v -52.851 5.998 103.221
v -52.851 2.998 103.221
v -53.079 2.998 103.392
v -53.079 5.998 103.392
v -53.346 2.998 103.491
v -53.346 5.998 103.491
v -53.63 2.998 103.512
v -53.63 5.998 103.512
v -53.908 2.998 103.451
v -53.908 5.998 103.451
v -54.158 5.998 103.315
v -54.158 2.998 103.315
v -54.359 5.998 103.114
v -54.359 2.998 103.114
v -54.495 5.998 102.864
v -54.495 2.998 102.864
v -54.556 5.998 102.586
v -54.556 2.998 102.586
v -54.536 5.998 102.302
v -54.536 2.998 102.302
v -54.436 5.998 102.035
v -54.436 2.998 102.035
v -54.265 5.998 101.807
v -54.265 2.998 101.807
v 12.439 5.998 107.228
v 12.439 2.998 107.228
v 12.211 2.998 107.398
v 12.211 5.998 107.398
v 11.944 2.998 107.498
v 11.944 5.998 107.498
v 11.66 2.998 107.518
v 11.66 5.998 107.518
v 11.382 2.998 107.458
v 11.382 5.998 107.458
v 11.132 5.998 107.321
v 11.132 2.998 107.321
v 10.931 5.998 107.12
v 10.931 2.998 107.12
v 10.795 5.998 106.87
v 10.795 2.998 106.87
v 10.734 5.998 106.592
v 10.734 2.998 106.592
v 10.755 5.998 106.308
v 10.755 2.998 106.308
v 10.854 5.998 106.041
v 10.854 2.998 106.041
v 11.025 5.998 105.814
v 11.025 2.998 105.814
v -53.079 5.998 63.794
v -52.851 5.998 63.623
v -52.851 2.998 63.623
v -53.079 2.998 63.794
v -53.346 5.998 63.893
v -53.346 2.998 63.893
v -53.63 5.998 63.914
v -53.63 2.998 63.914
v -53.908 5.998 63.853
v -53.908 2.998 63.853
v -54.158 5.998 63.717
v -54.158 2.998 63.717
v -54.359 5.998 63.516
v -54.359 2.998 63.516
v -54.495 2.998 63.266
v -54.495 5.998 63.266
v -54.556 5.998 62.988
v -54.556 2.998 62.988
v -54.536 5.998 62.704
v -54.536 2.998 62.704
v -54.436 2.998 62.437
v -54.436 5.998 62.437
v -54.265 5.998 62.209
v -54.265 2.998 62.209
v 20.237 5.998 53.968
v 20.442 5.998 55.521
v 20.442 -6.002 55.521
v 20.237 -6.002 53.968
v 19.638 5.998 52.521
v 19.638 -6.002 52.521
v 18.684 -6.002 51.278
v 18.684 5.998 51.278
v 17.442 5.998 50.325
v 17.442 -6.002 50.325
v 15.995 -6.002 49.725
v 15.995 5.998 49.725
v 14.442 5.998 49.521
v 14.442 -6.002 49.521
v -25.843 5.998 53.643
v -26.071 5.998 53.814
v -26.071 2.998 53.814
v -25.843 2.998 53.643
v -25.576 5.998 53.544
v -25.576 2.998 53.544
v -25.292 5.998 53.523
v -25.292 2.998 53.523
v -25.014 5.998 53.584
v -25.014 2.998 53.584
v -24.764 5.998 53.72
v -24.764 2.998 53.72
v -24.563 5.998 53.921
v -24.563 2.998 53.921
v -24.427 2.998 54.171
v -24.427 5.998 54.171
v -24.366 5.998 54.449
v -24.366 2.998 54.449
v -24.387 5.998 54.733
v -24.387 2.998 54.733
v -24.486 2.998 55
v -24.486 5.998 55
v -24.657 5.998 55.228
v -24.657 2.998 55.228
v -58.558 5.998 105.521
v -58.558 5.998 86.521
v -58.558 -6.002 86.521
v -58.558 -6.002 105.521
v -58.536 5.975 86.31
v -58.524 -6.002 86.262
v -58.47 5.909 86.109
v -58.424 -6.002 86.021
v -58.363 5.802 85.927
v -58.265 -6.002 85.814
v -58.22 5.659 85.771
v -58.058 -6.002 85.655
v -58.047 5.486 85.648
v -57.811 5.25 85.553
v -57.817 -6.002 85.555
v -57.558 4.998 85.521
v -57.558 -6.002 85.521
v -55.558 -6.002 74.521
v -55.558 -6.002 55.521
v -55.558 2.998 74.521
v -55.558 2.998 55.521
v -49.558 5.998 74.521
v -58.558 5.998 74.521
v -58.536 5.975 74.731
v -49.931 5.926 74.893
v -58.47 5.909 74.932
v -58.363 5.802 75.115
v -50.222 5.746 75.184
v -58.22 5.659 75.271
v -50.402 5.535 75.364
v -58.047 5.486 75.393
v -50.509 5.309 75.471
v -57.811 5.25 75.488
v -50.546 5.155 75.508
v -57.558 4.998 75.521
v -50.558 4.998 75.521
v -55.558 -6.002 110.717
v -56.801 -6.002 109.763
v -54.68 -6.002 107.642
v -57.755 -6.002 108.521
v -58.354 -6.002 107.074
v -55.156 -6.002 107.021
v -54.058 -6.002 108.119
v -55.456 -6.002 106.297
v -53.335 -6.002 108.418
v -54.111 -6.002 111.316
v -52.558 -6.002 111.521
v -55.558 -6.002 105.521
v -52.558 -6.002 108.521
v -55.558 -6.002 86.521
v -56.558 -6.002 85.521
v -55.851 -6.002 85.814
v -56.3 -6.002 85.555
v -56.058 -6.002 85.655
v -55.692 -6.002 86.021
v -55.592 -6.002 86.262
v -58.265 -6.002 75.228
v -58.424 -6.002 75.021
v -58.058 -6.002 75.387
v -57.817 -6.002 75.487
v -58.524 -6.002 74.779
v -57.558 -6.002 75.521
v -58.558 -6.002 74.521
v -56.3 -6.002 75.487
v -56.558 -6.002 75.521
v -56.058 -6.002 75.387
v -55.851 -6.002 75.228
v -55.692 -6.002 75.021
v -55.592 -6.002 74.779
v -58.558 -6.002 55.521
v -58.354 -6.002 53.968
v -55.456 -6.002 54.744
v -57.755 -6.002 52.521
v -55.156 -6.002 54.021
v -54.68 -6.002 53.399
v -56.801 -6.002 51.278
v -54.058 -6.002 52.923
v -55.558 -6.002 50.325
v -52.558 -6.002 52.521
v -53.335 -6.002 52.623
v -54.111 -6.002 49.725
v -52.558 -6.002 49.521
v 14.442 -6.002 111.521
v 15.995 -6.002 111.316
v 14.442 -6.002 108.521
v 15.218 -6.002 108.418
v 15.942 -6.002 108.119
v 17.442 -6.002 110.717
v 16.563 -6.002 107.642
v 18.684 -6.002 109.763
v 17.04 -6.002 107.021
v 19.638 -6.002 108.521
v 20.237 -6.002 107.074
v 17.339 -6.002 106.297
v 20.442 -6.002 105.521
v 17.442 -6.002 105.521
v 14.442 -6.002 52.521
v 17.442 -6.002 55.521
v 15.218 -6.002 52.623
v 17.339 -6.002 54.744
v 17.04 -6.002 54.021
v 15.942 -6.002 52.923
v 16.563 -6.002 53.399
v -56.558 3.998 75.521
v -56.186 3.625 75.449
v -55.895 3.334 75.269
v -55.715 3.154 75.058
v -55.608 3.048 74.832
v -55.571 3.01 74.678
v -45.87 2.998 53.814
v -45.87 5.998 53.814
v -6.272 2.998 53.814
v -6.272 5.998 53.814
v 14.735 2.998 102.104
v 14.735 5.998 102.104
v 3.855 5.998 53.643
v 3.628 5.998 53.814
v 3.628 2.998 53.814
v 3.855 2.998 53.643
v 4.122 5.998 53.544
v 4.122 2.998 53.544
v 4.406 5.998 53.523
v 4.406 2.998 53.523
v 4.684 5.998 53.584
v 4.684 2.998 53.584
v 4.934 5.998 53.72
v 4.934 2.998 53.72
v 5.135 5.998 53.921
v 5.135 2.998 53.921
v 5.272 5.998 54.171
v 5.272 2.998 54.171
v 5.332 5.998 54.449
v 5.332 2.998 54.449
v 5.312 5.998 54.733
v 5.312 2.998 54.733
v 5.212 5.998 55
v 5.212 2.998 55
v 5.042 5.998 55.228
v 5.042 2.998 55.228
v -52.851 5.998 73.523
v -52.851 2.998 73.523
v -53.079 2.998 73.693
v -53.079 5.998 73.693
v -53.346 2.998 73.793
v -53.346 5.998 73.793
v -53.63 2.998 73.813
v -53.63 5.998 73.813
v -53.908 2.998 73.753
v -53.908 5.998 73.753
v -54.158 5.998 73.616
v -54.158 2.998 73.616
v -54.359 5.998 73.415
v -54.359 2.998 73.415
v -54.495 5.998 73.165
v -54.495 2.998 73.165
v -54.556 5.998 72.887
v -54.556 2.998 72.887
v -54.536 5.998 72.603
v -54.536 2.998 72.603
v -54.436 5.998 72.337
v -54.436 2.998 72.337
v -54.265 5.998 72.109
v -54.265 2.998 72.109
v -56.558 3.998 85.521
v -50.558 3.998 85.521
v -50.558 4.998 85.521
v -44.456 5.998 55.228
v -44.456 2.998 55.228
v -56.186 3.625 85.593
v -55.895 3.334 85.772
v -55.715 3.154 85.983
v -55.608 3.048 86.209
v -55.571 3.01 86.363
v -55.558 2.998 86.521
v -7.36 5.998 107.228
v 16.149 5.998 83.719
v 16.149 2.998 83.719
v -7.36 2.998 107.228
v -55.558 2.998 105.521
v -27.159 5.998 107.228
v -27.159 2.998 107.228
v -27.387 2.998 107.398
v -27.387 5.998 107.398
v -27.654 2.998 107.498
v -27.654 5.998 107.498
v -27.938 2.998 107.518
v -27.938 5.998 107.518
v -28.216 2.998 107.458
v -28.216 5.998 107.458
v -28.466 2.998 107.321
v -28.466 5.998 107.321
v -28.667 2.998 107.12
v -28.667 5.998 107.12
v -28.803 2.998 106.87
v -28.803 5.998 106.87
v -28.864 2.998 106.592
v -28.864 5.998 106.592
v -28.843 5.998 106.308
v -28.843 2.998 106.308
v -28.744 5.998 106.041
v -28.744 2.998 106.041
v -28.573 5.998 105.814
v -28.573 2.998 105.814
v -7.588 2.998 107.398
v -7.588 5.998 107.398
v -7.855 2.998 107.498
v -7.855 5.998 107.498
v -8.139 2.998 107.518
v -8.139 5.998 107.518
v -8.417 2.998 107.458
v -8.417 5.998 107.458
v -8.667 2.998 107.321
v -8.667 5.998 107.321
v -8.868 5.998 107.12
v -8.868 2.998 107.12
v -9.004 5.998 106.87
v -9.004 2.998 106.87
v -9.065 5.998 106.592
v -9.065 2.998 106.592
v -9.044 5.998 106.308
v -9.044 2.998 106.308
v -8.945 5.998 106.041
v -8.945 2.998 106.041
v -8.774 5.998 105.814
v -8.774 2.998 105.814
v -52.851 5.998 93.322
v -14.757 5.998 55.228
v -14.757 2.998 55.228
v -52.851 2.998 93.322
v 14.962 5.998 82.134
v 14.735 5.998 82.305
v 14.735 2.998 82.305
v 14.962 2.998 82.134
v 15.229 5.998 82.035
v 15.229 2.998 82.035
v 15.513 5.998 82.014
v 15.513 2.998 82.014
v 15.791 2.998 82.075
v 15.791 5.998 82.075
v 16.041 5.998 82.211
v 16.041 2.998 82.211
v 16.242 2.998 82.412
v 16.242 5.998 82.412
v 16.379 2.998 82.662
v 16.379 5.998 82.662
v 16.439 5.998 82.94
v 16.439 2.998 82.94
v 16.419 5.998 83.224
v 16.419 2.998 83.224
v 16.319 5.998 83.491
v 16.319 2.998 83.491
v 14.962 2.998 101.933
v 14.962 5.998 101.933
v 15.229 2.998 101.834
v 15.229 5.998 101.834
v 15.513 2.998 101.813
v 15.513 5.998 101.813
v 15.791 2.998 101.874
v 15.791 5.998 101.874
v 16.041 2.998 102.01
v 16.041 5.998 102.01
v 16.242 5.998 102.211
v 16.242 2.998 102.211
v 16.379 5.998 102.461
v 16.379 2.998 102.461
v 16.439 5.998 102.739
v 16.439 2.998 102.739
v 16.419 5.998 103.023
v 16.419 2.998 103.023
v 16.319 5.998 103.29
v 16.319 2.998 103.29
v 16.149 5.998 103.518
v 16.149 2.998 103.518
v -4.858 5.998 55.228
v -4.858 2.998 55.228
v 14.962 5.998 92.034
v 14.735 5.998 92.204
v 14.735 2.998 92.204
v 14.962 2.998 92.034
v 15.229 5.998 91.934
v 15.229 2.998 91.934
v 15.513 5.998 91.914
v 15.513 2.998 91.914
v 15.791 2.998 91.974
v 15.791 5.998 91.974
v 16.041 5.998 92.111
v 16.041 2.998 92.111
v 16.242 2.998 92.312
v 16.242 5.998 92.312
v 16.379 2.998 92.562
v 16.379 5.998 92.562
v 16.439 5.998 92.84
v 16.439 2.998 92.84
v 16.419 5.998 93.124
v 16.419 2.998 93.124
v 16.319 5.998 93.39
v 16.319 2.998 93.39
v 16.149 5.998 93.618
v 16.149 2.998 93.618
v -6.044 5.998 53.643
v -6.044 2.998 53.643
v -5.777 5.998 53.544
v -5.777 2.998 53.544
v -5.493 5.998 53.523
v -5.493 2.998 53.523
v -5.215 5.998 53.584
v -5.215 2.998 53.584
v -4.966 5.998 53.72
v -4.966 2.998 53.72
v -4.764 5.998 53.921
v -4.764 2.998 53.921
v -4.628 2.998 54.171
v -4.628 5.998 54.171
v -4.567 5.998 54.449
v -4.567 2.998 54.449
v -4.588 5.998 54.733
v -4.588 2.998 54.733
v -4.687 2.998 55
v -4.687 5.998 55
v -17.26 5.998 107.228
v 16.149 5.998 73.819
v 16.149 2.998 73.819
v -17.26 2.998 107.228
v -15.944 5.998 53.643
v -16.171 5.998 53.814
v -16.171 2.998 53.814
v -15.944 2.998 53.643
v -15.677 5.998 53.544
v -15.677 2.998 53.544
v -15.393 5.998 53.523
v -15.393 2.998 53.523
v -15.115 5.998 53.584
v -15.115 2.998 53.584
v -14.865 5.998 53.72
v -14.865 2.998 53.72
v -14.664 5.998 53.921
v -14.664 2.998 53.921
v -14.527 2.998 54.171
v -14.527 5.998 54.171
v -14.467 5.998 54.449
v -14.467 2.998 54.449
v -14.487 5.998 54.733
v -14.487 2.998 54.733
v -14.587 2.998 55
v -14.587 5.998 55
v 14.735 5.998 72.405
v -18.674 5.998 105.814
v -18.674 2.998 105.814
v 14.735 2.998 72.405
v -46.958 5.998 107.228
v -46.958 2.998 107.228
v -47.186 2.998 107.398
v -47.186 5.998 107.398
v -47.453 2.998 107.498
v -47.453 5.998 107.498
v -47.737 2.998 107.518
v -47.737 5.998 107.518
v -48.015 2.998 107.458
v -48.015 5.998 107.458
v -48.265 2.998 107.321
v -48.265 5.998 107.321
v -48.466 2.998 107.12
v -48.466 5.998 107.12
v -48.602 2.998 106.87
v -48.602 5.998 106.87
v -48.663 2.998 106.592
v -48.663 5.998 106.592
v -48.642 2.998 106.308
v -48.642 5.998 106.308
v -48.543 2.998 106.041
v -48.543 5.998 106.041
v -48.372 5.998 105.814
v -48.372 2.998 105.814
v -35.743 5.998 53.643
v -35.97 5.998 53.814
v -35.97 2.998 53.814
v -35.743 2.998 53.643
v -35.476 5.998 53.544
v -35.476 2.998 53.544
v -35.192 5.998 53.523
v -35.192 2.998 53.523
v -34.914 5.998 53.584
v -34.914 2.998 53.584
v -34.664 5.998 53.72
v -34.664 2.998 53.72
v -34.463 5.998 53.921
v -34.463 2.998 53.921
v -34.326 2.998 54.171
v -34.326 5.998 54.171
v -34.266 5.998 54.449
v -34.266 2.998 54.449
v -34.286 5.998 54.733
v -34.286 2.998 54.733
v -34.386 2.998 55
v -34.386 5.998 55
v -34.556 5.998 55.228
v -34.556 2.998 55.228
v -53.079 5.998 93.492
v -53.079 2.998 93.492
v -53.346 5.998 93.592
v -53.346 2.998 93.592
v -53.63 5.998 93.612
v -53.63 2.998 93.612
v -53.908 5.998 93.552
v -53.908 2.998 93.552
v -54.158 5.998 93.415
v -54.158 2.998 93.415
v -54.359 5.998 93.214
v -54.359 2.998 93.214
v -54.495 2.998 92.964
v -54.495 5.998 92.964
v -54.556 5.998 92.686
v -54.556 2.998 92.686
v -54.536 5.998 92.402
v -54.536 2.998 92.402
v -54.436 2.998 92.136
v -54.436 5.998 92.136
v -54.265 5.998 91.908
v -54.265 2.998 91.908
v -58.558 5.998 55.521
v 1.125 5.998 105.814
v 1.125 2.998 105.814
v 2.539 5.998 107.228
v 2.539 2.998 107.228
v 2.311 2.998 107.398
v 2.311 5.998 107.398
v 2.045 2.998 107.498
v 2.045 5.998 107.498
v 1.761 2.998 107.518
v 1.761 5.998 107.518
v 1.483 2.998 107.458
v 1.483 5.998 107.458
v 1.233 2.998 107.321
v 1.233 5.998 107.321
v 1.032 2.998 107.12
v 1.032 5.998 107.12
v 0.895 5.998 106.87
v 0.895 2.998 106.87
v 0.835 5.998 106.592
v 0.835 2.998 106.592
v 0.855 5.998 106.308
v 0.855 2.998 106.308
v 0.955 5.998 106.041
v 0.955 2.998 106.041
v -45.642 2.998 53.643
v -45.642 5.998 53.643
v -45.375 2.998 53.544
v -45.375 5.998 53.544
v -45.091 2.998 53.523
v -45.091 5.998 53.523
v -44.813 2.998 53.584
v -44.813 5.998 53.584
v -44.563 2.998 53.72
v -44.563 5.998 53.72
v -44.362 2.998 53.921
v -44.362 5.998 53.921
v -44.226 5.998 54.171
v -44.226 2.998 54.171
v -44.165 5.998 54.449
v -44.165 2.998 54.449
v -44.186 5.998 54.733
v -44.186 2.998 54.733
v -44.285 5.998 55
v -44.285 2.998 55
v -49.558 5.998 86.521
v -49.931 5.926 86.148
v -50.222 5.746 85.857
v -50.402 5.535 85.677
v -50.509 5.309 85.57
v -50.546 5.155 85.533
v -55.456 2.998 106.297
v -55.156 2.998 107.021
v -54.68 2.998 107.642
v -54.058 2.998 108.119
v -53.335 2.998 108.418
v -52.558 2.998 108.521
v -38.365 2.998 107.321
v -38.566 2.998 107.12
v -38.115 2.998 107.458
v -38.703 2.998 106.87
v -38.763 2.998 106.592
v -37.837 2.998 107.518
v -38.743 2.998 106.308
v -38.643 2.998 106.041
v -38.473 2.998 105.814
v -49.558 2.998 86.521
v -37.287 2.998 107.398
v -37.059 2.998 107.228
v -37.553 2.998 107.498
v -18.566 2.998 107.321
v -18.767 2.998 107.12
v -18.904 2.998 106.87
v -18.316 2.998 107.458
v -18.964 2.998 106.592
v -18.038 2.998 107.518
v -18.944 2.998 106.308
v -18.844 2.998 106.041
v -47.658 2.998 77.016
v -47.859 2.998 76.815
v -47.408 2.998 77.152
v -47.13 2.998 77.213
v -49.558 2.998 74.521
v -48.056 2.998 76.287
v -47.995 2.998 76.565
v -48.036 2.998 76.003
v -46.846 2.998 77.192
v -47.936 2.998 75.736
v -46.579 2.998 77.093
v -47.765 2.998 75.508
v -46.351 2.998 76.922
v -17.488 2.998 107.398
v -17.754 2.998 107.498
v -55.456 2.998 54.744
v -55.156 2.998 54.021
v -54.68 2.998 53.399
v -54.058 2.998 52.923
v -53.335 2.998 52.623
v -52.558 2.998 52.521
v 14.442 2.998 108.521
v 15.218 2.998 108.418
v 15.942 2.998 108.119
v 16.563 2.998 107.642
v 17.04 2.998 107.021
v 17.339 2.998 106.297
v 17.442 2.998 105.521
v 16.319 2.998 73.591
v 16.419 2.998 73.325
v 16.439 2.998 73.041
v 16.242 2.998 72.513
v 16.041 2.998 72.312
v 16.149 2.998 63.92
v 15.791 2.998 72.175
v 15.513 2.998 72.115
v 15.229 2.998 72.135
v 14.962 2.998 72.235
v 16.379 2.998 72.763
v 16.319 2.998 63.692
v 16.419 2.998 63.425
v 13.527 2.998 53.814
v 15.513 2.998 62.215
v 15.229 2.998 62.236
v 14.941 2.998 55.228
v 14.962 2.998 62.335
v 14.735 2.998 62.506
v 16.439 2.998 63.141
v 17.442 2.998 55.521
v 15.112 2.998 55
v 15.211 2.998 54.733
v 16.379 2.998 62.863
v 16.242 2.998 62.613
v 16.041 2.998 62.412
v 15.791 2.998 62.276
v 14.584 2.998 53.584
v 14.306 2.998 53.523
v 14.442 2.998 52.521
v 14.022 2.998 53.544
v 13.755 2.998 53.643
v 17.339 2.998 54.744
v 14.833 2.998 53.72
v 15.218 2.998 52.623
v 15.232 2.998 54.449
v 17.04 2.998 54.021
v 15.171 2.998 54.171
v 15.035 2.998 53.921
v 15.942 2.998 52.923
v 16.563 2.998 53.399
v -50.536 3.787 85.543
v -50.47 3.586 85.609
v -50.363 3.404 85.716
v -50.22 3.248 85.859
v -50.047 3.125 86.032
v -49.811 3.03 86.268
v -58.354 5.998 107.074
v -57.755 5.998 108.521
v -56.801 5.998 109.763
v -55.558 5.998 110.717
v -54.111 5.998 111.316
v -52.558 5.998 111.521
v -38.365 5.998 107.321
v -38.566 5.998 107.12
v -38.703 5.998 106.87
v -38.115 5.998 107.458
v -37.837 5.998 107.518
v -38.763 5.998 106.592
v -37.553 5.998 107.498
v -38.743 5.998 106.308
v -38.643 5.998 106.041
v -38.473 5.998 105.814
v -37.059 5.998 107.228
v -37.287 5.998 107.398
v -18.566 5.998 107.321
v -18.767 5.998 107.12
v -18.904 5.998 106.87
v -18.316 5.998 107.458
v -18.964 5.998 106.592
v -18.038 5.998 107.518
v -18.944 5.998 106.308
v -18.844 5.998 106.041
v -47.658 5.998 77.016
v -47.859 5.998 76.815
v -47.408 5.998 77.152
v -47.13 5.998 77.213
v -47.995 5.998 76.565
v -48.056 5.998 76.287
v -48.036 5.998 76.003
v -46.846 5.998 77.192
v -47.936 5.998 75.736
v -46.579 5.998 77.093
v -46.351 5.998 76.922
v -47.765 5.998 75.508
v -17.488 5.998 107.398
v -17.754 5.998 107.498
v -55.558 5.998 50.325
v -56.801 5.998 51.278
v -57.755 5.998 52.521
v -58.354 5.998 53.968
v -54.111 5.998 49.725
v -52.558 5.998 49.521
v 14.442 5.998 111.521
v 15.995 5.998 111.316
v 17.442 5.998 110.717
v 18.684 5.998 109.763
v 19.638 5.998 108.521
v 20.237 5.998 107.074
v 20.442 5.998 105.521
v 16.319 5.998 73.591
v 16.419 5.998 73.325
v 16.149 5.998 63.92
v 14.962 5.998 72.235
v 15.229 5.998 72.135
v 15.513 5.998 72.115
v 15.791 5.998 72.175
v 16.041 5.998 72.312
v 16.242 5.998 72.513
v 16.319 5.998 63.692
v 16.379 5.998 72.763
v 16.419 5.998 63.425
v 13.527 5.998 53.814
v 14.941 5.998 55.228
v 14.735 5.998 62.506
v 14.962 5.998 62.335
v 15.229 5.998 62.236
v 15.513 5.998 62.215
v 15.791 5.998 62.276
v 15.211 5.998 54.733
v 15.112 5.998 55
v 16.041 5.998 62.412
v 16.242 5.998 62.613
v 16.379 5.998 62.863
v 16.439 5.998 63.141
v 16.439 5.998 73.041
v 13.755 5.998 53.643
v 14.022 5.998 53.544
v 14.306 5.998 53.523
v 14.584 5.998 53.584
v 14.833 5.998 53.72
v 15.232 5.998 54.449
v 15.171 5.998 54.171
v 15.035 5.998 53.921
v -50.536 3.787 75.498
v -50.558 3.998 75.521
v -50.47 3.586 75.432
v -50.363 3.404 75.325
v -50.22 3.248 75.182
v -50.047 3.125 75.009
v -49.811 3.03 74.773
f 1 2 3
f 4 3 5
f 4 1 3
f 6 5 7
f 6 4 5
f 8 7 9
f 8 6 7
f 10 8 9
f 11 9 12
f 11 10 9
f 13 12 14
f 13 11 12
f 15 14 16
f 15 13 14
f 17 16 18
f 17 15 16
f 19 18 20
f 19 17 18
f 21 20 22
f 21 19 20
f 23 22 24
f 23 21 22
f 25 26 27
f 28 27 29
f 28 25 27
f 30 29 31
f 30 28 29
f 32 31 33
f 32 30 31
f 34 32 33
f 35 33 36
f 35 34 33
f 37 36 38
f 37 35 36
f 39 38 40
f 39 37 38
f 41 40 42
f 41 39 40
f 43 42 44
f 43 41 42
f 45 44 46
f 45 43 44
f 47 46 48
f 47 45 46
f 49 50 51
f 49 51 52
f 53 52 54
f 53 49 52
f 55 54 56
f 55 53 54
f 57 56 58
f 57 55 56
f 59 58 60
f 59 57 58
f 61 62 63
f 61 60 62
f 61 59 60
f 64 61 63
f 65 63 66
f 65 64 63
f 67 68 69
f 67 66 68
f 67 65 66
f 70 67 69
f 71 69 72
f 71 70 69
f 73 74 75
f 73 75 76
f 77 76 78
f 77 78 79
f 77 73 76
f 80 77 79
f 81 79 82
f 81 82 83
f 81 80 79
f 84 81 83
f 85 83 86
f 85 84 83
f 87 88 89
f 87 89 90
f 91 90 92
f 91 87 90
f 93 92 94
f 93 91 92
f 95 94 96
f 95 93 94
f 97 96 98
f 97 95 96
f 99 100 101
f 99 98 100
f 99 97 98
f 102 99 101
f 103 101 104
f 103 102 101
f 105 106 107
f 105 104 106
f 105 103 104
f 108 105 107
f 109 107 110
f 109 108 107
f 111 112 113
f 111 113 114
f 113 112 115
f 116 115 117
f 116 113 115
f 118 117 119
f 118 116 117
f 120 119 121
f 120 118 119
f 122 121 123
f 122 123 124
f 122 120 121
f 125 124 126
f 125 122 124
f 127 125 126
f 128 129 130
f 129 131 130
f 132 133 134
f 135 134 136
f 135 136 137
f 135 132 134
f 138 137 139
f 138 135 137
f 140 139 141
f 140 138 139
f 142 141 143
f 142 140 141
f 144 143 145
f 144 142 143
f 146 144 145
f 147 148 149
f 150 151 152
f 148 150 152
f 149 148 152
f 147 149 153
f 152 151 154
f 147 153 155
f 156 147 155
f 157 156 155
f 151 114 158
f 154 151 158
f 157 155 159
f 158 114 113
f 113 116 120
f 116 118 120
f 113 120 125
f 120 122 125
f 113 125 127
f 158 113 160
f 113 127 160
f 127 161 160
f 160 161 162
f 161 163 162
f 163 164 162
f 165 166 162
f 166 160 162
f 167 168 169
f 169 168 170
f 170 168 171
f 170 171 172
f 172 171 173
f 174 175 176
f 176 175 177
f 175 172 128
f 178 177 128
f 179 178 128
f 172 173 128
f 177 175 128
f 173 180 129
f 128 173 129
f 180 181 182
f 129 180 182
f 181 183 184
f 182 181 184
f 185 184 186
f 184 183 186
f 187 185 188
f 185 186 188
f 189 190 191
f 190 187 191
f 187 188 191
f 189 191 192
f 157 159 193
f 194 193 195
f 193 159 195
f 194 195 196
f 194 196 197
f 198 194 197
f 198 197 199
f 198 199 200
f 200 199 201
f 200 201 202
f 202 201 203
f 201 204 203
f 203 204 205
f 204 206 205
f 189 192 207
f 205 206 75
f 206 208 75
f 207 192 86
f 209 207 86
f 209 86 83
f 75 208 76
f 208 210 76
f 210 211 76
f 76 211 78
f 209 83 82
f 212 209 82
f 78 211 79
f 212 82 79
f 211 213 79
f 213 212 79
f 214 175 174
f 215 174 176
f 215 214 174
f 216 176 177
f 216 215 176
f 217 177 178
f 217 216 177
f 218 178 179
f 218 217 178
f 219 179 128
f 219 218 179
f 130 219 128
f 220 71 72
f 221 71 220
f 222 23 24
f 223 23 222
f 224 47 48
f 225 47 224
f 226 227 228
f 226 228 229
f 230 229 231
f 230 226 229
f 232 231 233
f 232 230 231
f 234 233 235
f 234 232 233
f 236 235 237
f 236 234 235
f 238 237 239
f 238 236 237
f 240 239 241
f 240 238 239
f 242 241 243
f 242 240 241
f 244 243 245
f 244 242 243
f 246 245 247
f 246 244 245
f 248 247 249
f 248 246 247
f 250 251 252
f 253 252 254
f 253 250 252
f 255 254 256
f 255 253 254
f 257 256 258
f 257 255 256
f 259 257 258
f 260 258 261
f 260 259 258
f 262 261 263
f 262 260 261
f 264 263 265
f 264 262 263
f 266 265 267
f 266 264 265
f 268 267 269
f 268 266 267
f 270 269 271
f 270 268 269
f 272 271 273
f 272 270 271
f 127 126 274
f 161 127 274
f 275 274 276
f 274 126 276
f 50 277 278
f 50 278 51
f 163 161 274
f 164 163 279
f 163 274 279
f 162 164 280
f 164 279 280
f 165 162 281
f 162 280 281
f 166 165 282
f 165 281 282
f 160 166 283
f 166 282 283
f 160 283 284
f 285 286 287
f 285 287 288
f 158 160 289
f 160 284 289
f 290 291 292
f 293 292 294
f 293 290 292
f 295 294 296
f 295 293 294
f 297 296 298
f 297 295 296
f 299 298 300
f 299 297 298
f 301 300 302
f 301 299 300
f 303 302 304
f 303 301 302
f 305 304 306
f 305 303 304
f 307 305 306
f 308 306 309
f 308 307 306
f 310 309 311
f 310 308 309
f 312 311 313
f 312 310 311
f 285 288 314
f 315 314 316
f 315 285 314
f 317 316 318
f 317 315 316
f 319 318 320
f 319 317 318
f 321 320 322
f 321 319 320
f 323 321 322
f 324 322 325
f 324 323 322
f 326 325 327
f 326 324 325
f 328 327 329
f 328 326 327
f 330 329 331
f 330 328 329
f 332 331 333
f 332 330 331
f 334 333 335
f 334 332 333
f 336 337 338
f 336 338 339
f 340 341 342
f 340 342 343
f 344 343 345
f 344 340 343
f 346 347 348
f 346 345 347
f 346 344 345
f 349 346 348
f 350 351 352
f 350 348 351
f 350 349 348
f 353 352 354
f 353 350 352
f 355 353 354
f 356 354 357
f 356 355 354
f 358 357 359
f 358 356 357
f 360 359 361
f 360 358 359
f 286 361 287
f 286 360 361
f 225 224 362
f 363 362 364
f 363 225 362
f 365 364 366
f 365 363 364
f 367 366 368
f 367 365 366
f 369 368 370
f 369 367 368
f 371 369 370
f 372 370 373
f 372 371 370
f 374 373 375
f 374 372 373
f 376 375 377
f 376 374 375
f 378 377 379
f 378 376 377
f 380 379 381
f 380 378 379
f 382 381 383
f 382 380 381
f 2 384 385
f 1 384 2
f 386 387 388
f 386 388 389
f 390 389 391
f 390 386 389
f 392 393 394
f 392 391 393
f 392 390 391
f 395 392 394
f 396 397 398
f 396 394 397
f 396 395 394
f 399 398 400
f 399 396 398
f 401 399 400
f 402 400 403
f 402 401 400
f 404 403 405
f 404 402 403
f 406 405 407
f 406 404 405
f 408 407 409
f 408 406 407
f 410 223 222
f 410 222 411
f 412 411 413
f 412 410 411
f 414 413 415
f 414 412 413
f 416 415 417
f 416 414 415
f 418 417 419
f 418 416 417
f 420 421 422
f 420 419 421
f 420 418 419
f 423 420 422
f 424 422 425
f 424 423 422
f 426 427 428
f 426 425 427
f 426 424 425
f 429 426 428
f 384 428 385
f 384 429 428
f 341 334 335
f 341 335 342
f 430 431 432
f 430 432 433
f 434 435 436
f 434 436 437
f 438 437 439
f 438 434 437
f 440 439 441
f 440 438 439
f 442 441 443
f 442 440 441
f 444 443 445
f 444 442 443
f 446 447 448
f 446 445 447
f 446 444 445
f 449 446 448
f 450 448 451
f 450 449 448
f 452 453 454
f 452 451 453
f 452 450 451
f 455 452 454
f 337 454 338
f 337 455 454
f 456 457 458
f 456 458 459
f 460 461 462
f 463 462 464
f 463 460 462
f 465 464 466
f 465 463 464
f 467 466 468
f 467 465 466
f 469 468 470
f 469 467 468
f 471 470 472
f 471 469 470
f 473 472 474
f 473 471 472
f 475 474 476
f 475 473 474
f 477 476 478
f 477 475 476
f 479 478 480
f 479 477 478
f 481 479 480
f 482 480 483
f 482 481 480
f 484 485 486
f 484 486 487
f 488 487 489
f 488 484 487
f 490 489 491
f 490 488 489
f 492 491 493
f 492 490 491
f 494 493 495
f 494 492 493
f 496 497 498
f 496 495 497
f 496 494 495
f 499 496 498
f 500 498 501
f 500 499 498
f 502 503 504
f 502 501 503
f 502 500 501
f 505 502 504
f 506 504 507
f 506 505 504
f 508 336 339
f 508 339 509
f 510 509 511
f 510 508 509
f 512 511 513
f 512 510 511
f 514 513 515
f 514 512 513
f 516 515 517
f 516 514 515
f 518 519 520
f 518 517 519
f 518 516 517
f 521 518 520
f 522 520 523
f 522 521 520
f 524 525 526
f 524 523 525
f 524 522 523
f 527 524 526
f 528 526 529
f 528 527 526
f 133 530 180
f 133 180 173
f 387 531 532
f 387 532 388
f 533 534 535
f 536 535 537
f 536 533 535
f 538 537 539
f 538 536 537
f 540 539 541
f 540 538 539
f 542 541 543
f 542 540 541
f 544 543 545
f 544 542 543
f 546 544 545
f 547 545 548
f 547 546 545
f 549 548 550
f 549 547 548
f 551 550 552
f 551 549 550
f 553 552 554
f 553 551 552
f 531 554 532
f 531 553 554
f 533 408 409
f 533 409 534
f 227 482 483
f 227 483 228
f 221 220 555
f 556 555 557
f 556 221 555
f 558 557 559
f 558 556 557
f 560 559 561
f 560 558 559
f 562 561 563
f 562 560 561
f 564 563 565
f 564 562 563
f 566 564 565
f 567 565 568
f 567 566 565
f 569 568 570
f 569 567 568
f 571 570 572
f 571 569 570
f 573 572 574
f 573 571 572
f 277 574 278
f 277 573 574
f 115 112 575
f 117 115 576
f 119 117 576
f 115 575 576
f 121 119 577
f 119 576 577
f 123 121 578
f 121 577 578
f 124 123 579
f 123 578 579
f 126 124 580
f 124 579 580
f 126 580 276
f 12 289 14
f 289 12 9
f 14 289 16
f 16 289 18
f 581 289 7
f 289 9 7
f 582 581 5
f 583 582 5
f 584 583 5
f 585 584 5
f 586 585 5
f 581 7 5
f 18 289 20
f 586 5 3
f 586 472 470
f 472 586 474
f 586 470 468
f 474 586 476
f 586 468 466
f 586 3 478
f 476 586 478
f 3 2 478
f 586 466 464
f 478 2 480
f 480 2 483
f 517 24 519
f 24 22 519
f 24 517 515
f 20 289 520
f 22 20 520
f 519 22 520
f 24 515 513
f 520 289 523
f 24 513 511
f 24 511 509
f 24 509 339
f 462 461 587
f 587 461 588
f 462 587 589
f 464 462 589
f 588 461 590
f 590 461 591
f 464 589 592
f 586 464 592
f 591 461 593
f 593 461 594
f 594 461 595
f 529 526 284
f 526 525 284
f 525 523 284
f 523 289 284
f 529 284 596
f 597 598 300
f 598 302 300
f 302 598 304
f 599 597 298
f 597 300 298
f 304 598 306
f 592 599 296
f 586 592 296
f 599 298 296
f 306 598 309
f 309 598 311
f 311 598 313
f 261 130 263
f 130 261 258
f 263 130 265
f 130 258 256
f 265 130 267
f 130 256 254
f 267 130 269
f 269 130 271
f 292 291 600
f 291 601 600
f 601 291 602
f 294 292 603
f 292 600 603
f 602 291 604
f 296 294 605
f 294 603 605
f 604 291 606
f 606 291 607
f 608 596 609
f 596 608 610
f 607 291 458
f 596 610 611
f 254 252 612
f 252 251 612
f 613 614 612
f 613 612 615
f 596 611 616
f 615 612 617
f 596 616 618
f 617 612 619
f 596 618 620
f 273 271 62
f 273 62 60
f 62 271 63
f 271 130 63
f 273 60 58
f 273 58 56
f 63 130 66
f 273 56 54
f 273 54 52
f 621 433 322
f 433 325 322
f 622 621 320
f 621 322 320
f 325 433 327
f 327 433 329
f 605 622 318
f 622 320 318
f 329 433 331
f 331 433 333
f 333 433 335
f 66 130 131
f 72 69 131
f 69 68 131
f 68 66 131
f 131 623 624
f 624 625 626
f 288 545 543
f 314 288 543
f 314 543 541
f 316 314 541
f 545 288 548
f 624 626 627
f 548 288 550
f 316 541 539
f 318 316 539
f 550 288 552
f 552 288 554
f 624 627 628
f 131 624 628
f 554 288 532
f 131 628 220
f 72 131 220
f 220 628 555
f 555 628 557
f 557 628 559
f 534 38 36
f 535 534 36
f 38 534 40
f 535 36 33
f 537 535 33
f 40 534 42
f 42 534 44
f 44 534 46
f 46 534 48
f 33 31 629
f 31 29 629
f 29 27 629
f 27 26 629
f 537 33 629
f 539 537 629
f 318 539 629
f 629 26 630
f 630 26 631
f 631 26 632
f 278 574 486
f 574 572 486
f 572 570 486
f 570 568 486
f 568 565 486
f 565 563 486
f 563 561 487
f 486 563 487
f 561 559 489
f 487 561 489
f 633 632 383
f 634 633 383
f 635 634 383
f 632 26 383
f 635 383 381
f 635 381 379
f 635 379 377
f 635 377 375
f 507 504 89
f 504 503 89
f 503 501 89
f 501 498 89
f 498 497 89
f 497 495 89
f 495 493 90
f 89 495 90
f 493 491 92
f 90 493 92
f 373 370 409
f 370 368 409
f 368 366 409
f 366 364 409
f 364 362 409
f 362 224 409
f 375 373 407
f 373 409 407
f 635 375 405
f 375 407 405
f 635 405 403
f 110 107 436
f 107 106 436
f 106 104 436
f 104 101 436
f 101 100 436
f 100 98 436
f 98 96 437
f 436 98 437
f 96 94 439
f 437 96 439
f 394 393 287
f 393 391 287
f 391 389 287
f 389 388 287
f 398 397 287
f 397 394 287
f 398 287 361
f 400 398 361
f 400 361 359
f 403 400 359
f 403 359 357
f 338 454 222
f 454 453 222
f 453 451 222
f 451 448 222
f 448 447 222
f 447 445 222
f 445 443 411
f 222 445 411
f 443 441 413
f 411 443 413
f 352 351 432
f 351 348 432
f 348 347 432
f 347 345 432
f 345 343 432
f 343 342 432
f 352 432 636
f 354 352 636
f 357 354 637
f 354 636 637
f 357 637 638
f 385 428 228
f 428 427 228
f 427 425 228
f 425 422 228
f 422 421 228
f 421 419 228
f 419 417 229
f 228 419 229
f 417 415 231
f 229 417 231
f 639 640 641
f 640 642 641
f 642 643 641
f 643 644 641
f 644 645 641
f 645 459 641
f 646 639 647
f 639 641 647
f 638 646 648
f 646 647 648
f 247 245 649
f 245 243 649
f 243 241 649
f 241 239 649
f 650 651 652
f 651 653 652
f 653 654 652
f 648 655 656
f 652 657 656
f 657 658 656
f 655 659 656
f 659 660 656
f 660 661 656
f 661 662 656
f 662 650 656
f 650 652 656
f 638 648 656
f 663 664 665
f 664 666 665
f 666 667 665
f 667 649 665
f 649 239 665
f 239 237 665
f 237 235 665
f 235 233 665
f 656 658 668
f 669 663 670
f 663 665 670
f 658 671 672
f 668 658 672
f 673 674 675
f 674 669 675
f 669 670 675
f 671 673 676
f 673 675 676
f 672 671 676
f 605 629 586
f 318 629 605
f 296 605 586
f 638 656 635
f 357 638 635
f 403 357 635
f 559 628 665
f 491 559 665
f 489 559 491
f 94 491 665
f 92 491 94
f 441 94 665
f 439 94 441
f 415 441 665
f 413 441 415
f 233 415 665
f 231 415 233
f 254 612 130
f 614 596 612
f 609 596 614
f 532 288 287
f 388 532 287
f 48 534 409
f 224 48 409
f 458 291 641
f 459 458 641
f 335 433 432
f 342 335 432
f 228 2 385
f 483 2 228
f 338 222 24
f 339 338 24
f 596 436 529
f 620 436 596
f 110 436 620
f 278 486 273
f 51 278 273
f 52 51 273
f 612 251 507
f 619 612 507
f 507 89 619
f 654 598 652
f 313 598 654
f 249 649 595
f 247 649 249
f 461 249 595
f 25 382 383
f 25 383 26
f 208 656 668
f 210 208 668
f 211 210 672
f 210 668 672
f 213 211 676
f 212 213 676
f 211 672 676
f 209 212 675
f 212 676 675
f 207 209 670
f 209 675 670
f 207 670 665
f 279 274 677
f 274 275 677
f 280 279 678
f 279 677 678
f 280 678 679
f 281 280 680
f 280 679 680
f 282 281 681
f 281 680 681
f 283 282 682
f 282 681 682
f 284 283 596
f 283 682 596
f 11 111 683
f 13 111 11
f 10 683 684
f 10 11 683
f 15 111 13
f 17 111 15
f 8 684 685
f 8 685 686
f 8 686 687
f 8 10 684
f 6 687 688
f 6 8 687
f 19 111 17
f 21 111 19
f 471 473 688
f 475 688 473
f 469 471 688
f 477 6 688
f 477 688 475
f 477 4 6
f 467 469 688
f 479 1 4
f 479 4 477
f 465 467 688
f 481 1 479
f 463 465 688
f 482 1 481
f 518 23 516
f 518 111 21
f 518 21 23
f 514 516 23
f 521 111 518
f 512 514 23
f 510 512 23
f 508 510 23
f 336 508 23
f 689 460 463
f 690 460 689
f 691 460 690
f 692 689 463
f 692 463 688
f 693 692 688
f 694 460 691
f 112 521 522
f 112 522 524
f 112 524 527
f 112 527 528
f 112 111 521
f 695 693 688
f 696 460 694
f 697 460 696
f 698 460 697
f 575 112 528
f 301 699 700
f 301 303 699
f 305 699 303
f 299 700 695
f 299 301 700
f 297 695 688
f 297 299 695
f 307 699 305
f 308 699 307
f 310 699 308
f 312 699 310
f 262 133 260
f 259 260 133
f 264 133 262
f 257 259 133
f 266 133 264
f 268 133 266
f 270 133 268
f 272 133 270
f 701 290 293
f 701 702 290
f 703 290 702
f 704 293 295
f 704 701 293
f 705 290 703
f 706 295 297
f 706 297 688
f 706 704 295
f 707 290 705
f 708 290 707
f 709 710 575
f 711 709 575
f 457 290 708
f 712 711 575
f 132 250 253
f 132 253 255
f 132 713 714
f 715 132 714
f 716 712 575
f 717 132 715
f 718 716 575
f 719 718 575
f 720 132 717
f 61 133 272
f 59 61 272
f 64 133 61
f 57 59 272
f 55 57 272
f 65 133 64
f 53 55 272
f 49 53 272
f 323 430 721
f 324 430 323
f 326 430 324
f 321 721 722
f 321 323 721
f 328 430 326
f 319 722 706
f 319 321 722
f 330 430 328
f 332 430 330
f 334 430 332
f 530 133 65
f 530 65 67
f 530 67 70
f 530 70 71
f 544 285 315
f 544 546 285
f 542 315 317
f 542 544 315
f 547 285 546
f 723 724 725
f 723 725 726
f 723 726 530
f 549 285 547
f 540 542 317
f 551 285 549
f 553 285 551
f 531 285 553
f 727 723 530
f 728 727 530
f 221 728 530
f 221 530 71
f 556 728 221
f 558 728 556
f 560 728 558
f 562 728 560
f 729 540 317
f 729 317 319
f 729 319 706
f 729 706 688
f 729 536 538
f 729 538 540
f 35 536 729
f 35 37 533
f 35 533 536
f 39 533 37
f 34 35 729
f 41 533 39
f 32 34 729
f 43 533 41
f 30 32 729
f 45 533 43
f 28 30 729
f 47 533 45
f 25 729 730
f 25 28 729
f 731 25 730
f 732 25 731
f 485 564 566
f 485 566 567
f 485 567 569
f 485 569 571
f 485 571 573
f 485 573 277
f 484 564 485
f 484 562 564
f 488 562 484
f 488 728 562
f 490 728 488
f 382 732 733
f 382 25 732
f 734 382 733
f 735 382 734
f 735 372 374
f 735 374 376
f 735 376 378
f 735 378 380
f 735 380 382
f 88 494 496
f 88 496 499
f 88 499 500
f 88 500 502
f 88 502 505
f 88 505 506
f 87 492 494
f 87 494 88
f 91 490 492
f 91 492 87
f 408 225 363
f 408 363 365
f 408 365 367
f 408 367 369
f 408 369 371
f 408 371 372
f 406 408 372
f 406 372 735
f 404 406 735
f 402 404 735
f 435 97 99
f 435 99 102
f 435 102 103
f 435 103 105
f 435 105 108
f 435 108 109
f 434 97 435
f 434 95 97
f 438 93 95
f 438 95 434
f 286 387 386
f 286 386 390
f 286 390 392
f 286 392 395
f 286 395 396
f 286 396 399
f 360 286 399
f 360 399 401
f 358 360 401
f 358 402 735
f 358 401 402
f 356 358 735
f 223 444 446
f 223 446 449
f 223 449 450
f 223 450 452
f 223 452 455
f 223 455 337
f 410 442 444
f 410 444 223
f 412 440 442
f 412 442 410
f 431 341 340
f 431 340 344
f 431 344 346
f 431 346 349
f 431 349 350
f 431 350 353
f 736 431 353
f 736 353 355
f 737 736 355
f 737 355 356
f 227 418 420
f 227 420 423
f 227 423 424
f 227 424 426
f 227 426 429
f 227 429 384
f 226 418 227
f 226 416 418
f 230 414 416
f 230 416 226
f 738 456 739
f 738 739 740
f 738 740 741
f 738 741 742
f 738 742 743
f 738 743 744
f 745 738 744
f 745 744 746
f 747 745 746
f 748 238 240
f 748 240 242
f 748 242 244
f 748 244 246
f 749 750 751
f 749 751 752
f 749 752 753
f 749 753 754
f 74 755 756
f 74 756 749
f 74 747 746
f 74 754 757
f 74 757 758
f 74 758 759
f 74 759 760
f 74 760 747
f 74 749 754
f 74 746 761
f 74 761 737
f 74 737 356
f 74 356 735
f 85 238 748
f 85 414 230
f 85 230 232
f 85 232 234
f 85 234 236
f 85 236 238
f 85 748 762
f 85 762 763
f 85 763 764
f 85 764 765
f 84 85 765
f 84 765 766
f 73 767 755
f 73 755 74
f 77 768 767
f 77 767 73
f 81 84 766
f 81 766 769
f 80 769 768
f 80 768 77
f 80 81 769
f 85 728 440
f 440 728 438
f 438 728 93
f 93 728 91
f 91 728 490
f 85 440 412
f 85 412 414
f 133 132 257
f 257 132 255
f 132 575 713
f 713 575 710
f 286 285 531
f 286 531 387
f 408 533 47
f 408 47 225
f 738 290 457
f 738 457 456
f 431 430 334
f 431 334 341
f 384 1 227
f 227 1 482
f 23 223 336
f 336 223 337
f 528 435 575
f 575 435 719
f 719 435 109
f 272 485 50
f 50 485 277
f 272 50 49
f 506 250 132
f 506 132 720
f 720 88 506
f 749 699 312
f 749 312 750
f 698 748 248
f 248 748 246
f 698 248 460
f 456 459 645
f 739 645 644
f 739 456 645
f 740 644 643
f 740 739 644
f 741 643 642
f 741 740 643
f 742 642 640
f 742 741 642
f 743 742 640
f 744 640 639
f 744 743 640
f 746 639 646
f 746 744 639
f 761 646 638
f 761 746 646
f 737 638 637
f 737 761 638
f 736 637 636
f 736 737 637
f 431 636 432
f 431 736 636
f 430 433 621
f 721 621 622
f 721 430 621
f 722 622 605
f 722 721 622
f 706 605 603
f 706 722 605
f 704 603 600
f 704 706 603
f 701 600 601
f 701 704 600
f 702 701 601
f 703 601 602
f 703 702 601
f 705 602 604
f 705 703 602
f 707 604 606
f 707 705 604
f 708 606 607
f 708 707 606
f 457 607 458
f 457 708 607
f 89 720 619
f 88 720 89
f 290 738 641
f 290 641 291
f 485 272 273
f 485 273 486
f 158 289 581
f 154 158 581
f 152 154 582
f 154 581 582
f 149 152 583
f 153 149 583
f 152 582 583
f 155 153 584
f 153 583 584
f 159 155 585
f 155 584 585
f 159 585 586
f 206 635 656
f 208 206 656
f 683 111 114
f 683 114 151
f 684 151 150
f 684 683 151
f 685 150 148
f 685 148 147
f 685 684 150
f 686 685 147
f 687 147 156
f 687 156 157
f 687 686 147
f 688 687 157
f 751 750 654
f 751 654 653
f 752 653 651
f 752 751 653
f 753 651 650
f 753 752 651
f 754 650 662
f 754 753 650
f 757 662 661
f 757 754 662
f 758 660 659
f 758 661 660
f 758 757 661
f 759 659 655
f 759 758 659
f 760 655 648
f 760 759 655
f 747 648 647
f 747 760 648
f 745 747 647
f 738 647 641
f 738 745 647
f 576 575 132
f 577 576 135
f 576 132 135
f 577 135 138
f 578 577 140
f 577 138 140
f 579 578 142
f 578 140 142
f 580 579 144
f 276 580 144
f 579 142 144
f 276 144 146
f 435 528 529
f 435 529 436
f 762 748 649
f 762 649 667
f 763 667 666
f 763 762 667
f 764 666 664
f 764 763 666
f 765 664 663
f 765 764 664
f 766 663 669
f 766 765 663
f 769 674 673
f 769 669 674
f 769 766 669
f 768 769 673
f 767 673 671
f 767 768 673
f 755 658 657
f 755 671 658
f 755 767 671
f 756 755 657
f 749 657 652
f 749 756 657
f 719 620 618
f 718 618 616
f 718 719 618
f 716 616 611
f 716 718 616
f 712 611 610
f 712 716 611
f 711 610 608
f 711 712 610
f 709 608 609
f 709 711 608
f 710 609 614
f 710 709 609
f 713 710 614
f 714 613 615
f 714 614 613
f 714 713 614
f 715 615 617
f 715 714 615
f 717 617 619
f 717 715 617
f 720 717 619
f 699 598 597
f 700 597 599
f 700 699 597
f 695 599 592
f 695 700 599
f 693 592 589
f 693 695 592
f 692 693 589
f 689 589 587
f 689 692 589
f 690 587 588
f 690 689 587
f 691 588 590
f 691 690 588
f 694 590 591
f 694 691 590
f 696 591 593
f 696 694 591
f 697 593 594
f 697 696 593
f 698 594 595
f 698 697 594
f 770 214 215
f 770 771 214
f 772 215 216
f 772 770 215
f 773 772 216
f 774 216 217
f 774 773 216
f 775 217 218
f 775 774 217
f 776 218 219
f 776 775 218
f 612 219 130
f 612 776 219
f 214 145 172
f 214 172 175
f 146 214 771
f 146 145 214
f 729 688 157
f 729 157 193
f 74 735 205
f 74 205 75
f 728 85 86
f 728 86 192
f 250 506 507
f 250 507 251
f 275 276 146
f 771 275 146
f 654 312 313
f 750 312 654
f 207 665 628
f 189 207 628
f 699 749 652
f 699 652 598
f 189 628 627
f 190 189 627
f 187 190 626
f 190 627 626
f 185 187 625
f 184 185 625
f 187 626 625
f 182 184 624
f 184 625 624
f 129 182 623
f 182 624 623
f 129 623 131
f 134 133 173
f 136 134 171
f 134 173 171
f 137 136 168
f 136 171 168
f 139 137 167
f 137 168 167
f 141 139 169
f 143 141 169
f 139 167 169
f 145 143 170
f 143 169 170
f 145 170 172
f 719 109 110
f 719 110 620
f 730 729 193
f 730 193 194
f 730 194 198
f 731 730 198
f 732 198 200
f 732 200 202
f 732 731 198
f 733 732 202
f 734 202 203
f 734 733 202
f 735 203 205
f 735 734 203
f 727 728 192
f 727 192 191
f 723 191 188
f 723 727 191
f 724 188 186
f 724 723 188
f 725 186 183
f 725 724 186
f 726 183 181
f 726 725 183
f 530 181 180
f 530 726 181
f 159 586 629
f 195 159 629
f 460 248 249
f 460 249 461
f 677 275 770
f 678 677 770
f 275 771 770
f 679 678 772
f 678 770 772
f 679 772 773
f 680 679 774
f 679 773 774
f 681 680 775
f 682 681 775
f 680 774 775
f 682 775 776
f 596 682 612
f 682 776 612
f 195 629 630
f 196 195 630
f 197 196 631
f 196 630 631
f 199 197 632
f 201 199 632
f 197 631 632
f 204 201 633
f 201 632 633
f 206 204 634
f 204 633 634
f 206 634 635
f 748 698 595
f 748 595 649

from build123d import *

# Parameters (mm, degrees)
RESSALTO_EXTRUS_O1_DEPTH = 12
CASCA1_T                 = -3
ESBO_O3_W                = 8
ESBO_O3_H                = 10
CORTE_EXTRUS_O2_DEPTH    = 13
FILETE1_R                = 1
CORTE_EXTRUS_O5_REACH    = 14


with BuildPart() as part:
    # Esboço2 → Ressalto-extrusão1 (new body)
    with BuildSketch(Plane(origin=(0, 5.997724004, 0), x_dir=(1, 0, 0), z_dir=(0, 1, 0))):
        with BuildLine():
            Line((-58.558389249, -55.520655269), (-58.558389249, -105.520655269))
            ThreePointArc((-58.558389249, -105.520655269), (-56.801029936, -109.763295956), (-52.558389249, -111.520655269))
            Line((-52.558389249, -111.520655269), (14.441610751, -111.520655269))
            ThreePointArc((14.441610751, -111.520655269), (18.684251438, -109.763295956), (20.441610751, -105.520655269))
            Line((20.441610751, -105.520655269), (20.441610751, -55.520655269))
            ThreePointArc((20.441610751, -55.520655269), (18.684251438, -51.278014582), (14.441610751, -49.520655269))
            Line((14.441610751, -49.520655269), (-52.558389249, -49.520655269))
            ThreePointArc((-52.558389249, -49.520655269), (-56.801029936, -51.278014582), (-58.558389249, -55.520655269))
        make_face()
    extrude(amount=-RESSALTO_EXTRUS_O1_DEPTH)

    # Casca1
    casca1_openings = [part.faces().sort_by_distance(p)[0] for p in [
        (-19.058389249, -6.002275996, 80.520655269),
    ]]
    offset(amount=CASCA1_T, openings=casca1_openings, kind=Kind.INTERSECTION)

    # Esboço3 → Corte-extrusão2 (cut, through all)
    with BuildSketch(Plane(origin=(0, 5.997724004, 0), x_dir=(1, 0, 0), z_dir=(0, 1, 0))):
        with Locations((-54.558389249, -80.520655269)):
            Rectangle(ESBO_O3_W, ESBO_O3_H)
    extrude(amount=-CORTE_EXTRUS_O2_DEPTH, mode=Mode.SUBTRACT)

    # Filete1
    filete1_edges = [part.edges().sort_by_distance(p)[0] for p in [
        (-53.058389249, 2.997724004, 85.520655269),
        (-50.558389249, 2.997724004, 80.520655269),
        (-53.058389249, 2.997724004, 75.520655269),
        (-55.558389249, -1.502275996, 75.520655269),
        (-58.558389249, -0.002275996, 75.520655269),
        (-55.558389249, -1.502275996, 85.520655269),
        (-58.558389249, -0.002275996, 85.520655269),
        (-54.558389249, 5.997724004, 85.520655269),
        (-50.558389249, 5.997724004, 80.520655269),
        (-54.558389249, 5.997724004, 75.520655269),
    ]]
    fillet(filete1_edges, radius=FILETE1_R)

    # Esboço8 → Corte-extrusão5 (cut, up to next)
    with BuildSketch(Plane(origin=(0, 5.997724004, 0), x_dir=(1, 0, 0), z_dir=(0, 1, 0)), mode=Mode.PRIVATE) as corte_extrus_o5_sk1:
        with BuildLine():
            Line((-54.26549603, -62.209172871), (-45.869871648, -53.813548488))
            ThreePointArc((-45.869871648, -53.813548488), (-44.455658085, -53.813548488), (-44.455658085, -55.22776205))
            Line((-44.455658085, -55.22776205), (-52.851282468, -63.623386433))
            ThreePointArc((-52.851282468, -63.623386433), (-54.26549603, -63.623386433), (-54.26549603, -62.209172871))
        make_face()
    corte_extrus_o5_tool1 = extrude(corte_extrus_o5_sk1.sketch, amount=-CORTE_EXTRUS_O5_REACH, mode=Mode.PRIVATE) & part.part
    add(corte_extrus_o5_tool1.solids().sort_by_distance((-49.360577, 5.997724, 58.718467))[0], mode=Mode.SUBTRACT)
    # Esboço8 → Corte-extrusão5 (cut, up to next)
    with BuildSketch(Plane(origin=(0, 5.997724004, 0), x_dir=(1, 0, 0), z_dir=(0, 1, 0)), mode=Mode.PRIVATE) as corte_extrus_o5_sk2:
        with BuildLine():
            Line((-54.26549603, -72.108667807), (-35.970376711, -53.813548488))
            ThreePointArc((-35.970376711, -53.813548488), (-34.556163149, -53.813548488), (-34.556163149, -55.22776205))
            Line((-34.556163149, -55.22776205), (-52.851282468, -73.52288137))
            ThreePointArc((-52.851282468, -73.52288137), (-54.26549603, -73.52288137), (-54.26549603, -72.108667807))
        make_face()
    corte_extrus_o5_tool2 = extrude(corte_extrus_o5_sk2.sketch, amount=-CORTE_EXTRUS_O5_REACH, mode=Mode.PRIVATE) & part.part
    add(corte_extrus_o5_tool2.solids().sort_by_distance((-44.41083, 5.997724, 63.668215))[0], mode=Mode.SUBTRACT)
    # Esboço8 → Corte-extrusão5 (cut, up to next)
    with BuildSketch(Plane(origin=(0, 5.997724004, 0), x_dir=(1, 0, 0), z_dir=(0, 1, 0)), mode=Mode.PRIVATE) as corte_extrus_o5_sk3:
        with BuildLine():
            Line((-47.76549603, -75.508162744), (-26.070881774, -53.813548488))
            ThreePointArc((-26.070881774, -53.813548488), (-24.656668212, -53.813548488), (-24.656668212, -55.22776205))
            Line((-24.656668212, -55.22776205), (-46.351282468, -76.922376306))
            ThreePointArc((-46.351282468, -76.922376306), (-47.76549603, -76.922376306), (-47.76549603, -75.508162744))
        make_face()
    corte_extrus_o5_tool3 = extrude(corte_extrus_o5_sk3.sketch, amount=-CORTE_EXTRUS_O5_REACH, mode=Mode.PRIVATE) & part.part
    add(corte_extrus_o5_tool3.solids().sort_by_distance((-36.211082, 5.997724, 65.367962))[0], mode=Mode.SUBTRACT)
    # Esboço8 → Corte-extrusão5 (cut, up to next)
    with BuildSketch(Plane(origin=(0, 5.997724004, 0), x_dir=(1, 0, 0), z_dir=(0, 1, 0)), mode=Mode.PRIVATE) as corte_extrus_o5_sk4:
        with BuildLine():
            Line((-54.26549603, -91.90765768), (-16.171386838, -53.813548488))
            ThreePointArc((-16.171386838, -53.813548488), (-14.757173275, -53.813548488), (-14.757173275, -55.22776205))
            Line((-14.757173275, -55.22776205), (-52.851282468, -93.321871243))
            ThreePointArc((-52.851282468, -93.321871243), (-54.26549603, -93.321871243), (-54.26549603, -91.90765768))
        make_face()
    corte_extrus_o5_tool4 = extrude(corte_extrus_o5_sk4.sketch, amount=-CORTE_EXTRUS_O5_REACH, mode=Mode.PRIVATE) & part.part
    add(corte_extrus_o5_tool4.solids().sort_by_distance((-34.511335, 5.997724, 73.56771))[0], mode=Mode.SUBTRACT)
    # Esboço8 → Corte-extrusão5 (cut, up to next)
    with BuildSketch(Plane(origin=(0, 5.997724004, 0), x_dir=(1, 0, 0), z_dir=(0, 1, 0)), mode=Mode.PRIVATE) as corte_extrus_o5_sk5:
        with BuildLine():
            Line((-4.857678339, -55.22776205), (-52.851282468, -103.221366179))
            ThreePointArc((-52.851282468, -103.221366179), (-54.26549603, -103.221366179), (-54.26549603, -101.807152617))
            Line((-54.26549603, -101.807152617), (-6.271891901, -53.813548488))
            ThreePointArc((-6.271891901, -53.813548488), (-4.857678339, -53.813548488), (-4.857678339, -55.22776205))
        make_face()
    corte_extrus_o5_tool5 = extrude(corte_extrus_o5_sk5.sketch, amount=-CORTE_EXTRUS_O5_REACH, mode=Mode.PRIVATE) & part.part
    add(corte_extrus_o5_tool5.solids().sort_by_distance((-29.561587, 5.997724, 78.517457))[0], mode=Mode.SUBTRACT)
    # Esboço8 → Corte-extrusão5 (cut, up to next)
    with BuildSketch(Plane(origin=(0, 5.997724004, 0), x_dir=(1, 0, 0), z_dir=(0, 1, 0)), mode=Mode.PRIVATE) as corte_extrus_o5_sk6:
        with BuildLine():
            Line((-48.372396965, -105.813548488), (3.627603035, -53.813548488))
            ThreePointArc((3.627603035, -53.813548488), (5.041816598, -53.813548488), (5.041816598, -55.22776205))
            Line((5.041816598, -55.22776205), (-46.958183402, -107.22776205))
            ThreePointArc((-46.958183402, -107.22776205), (-48.372396965, -107.22776205), (-48.372396965, -105.813548488))
        make_face()
    corte_extrus_o5_tool6 = extrude(corte_extrus_o5_sk6.sketch, amount=-CORTE_EXTRUS_O5_REACH, mode=Mode.PRIVATE) & part.part
    add(corte_extrus_o5_tool6.solids().sort_by_distance((-21.66529, 5.997724, 80.520655))[0], mode=Mode.SUBTRACT)
    # Esboço8 → Corte-extrusão5 (cut, up to next)
    with BuildSketch(Plane(origin=(0, 5.997724004, 0), x_dir=(1, 0, 0), z_dir=(0, 1, 0)), mode=Mode.PRIVATE) as corte_extrus_o5_sk7:
        with BuildLine():
            Line((14.941311534, -55.22776205), (-37.058688466, -107.22776205))
            ThreePointArc((-37.058688466, -107.22776205), (-38.472902028, -107.22776205), (-38.472902028, -105.813548488))
            Line((-38.472902028, -105.813548488), (13.527097972, -53.813548488))
            ThreePointArc((13.527097972, -53.813548488), (14.941311534, -53.813548488), (14.941311534, -55.22776205))
        make_face()
    corte_extrus_o5_tool7 = extrude(corte_extrus_o5_sk7.sketch, amount=-CORTE_EXTRUS_O5_REACH, mode=Mode.PRIVATE) & part.part
    add(corte_extrus_o5_tool7.solids().sort_by_distance((-11.765795, 5.997724, 80.520655))[0], mode=Mode.SUBTRACT)
    # Esboço8 → Corte-extrusão5 (cut, up to next)
    with BuildSketch(Plane(origin=(0, 5.997724004, 0), x_dir=(1, 0, 0), z_dir=(0, 1, 0)), mode=Mode.PRIVATE) as corte_extrus_o5_sk8:
        with BuildLine():
            Line((-28.573407091, -105.813548488), (14.73450397, -62.505637427))
            ThreePointArc((14.73450397, -62.505637427), (16.148717532, -62.505637427), (16.148717532, -63.919850989))
            Line((16.148717532, -63.919850989), (-27.159193529, -107.22776205))
            ThreePointArc((-27.159193529, -107.22776205), (-28.573407091, -107.22776205), (-28.573407091, -105.813548488))
        make_face()
    corte_extrus_o5_tool8 = extrude(corte_extrus_o5_sk8.sketch, amount=-CORTE_EXTRUS_O5_REACH, mode=Mode.PRIVATE) & part.part
    add(corte_extrus_o5_tool8.solids().sort_by_distance((-6.212345, 5.997724, 84.8667))[0], mode=Mode.SUBTRACT)
    # Esboço8 → Corte-extrusão5 (cut, up to next)
    with BuildSketch(Plane(origin=(0, 5.997724004, 0), x_dir=(1, 0, 0), z_dir=(0, 1, 0)), mode=Mode.PRIVATE) as corte_extrus_o5_sk9:
        with BuildLine():
            Line((16.148717532, -73.819345926), (-17.259698592, -107.22776205))
            ThreePointArc((-17.259698592, -107.22776205), (-18.673912155, -107.22776205), (-18.673912155, -105.813548488))
            Line((-18.673912155, -105.813548488), (14.73450397, -72.405132363))
            ThreePointArc((14.73450397, -72.405132363), (16.148717532, -72.405132363), (16.148717532, -73.819345926))
        make_face()
    corte_extrus_o5_tool9 = extrude(corte_extrus_o5_sk9.sketch, amount=-CORTE_EXTRUS_O5_REACH, mode=Mode.PRIVATE) & part.part
    add(corte_extrus_o5_tool9.solids().sort_by_distance((-1.262597, 5.997724, 89.816447))[0], mode=Mode.SUBTRACT)
    # Esboço8 → Corte-extrusão5 (cut, up to next)
    with BuildSketch(Plane(origin=(0, 5.997724004, 0), x_dir=(1, 0, 0), z_dir=(0, 1, 0)), mode=Mode.PRIVATE) as corte_extrus_o5_sk10:
        with BuildLine():
            Line((-8.774417218, -105.813548488), (14.73450397, -82.3046273))
            ThreePointArc((14.73450397, -82.3046273), (16.148717532, -82.3046273), (16.148717532, -83.718840862))
            Line((16.148717532, -83.718840862), (-7.360203656, -107.22776205))
            ThreePointArc((-7.360203656, -107.22776205), (-8.774417218, -107.22776205), (-8.774417218, -105.813548488))
        make_face()
    corte_extrus_o5_tool10 = extrude(corte_extrus_o5_sk10.sketch, amount=-CORTE_EXTRUS_O5_REACH, mode=Mode.PRIVATE) & part.part
    add(corte_extrus_o5_tool10.solids().sort_by_distance((3.68715, 5.997724, 94.766195))[0], mode=Mode.SUBTRACT)
    # Esboço8 → Corte-extrusão5 (cut, up to next)
    with BuildSketch(Plane(origin=(0, 5.997724004, 0), x_dir=(1, 0, 0), z_dir=(0, 1, 0)), mode=Mode.PRIVATE) as corte_extrus_o5_sk11:
        with BuildLine():
            Line((16.148717532, -93.618335799), (2.539291281, -107.22776205))
            ThreePointArc((2.539291281, -107.22776205), (1.125077719, -107.22776205), (1.125077719, -105.813548488))
            Line((1.125077719, -105.813548488), (14.73450397, -92.204122237))
            ThreePointArc((14.73450397, -92.204122237), (16.148717532, -92.204122237), (16.148717532, -93.618335799))
        make_face()
    corte_extrus_o5_tool11 = extrude(corte_extrus_o5_sk11.sketch, amount=-CORTE_EXTRUS_O5_REACH, mode=Mode.PRIVATE) & part.part
    add(corte_extrus_o5_tool11.solids().sort_by_distance((8.636898, 5.997724, 99.715942))[0], mode=Mode.SUBTRACT)
    # Esboço8 → Corte-extrusão5 (cut, up to next)
    with BuildSketch(Plane(origin=(0, 5.997724004, 0), x_dir=(1, 0, 0), z_dir=(0, 1, 0)), mode=Mode.PRIVATE) as corte_extrus_o5_sk12:
        with BuildLine():
            Line((11.024572655, -105.813548488), (14.73450397, -102.103617173))
            ThreePointArc((14.73450397, -102.103617173), (16.148717532, -102.103617173), (16.148717532, -103.517830736))
            Line((16.148717532, -103.517830736), (12.438786218, -107.22776205))
            ThreePointArc((12.438786218, -107.22776205), (11.024572655, -107.22776205), (11.024572655, -105.813548488))
        make_face()
    corte_extrus_o5_tool12 = extrude(corte_extrus_o5_sk12.sketch, amount=-CORTE_EXTRUS_O5_REACH, mode=Mode.PRIVATE) & part.part
    add(corte_extrus_o5_tool12.solids().sort_by_distance((13.586645, 5.997724, 104.66569))[0], mode=Mode.SUBTRACT)


solid = part.part
